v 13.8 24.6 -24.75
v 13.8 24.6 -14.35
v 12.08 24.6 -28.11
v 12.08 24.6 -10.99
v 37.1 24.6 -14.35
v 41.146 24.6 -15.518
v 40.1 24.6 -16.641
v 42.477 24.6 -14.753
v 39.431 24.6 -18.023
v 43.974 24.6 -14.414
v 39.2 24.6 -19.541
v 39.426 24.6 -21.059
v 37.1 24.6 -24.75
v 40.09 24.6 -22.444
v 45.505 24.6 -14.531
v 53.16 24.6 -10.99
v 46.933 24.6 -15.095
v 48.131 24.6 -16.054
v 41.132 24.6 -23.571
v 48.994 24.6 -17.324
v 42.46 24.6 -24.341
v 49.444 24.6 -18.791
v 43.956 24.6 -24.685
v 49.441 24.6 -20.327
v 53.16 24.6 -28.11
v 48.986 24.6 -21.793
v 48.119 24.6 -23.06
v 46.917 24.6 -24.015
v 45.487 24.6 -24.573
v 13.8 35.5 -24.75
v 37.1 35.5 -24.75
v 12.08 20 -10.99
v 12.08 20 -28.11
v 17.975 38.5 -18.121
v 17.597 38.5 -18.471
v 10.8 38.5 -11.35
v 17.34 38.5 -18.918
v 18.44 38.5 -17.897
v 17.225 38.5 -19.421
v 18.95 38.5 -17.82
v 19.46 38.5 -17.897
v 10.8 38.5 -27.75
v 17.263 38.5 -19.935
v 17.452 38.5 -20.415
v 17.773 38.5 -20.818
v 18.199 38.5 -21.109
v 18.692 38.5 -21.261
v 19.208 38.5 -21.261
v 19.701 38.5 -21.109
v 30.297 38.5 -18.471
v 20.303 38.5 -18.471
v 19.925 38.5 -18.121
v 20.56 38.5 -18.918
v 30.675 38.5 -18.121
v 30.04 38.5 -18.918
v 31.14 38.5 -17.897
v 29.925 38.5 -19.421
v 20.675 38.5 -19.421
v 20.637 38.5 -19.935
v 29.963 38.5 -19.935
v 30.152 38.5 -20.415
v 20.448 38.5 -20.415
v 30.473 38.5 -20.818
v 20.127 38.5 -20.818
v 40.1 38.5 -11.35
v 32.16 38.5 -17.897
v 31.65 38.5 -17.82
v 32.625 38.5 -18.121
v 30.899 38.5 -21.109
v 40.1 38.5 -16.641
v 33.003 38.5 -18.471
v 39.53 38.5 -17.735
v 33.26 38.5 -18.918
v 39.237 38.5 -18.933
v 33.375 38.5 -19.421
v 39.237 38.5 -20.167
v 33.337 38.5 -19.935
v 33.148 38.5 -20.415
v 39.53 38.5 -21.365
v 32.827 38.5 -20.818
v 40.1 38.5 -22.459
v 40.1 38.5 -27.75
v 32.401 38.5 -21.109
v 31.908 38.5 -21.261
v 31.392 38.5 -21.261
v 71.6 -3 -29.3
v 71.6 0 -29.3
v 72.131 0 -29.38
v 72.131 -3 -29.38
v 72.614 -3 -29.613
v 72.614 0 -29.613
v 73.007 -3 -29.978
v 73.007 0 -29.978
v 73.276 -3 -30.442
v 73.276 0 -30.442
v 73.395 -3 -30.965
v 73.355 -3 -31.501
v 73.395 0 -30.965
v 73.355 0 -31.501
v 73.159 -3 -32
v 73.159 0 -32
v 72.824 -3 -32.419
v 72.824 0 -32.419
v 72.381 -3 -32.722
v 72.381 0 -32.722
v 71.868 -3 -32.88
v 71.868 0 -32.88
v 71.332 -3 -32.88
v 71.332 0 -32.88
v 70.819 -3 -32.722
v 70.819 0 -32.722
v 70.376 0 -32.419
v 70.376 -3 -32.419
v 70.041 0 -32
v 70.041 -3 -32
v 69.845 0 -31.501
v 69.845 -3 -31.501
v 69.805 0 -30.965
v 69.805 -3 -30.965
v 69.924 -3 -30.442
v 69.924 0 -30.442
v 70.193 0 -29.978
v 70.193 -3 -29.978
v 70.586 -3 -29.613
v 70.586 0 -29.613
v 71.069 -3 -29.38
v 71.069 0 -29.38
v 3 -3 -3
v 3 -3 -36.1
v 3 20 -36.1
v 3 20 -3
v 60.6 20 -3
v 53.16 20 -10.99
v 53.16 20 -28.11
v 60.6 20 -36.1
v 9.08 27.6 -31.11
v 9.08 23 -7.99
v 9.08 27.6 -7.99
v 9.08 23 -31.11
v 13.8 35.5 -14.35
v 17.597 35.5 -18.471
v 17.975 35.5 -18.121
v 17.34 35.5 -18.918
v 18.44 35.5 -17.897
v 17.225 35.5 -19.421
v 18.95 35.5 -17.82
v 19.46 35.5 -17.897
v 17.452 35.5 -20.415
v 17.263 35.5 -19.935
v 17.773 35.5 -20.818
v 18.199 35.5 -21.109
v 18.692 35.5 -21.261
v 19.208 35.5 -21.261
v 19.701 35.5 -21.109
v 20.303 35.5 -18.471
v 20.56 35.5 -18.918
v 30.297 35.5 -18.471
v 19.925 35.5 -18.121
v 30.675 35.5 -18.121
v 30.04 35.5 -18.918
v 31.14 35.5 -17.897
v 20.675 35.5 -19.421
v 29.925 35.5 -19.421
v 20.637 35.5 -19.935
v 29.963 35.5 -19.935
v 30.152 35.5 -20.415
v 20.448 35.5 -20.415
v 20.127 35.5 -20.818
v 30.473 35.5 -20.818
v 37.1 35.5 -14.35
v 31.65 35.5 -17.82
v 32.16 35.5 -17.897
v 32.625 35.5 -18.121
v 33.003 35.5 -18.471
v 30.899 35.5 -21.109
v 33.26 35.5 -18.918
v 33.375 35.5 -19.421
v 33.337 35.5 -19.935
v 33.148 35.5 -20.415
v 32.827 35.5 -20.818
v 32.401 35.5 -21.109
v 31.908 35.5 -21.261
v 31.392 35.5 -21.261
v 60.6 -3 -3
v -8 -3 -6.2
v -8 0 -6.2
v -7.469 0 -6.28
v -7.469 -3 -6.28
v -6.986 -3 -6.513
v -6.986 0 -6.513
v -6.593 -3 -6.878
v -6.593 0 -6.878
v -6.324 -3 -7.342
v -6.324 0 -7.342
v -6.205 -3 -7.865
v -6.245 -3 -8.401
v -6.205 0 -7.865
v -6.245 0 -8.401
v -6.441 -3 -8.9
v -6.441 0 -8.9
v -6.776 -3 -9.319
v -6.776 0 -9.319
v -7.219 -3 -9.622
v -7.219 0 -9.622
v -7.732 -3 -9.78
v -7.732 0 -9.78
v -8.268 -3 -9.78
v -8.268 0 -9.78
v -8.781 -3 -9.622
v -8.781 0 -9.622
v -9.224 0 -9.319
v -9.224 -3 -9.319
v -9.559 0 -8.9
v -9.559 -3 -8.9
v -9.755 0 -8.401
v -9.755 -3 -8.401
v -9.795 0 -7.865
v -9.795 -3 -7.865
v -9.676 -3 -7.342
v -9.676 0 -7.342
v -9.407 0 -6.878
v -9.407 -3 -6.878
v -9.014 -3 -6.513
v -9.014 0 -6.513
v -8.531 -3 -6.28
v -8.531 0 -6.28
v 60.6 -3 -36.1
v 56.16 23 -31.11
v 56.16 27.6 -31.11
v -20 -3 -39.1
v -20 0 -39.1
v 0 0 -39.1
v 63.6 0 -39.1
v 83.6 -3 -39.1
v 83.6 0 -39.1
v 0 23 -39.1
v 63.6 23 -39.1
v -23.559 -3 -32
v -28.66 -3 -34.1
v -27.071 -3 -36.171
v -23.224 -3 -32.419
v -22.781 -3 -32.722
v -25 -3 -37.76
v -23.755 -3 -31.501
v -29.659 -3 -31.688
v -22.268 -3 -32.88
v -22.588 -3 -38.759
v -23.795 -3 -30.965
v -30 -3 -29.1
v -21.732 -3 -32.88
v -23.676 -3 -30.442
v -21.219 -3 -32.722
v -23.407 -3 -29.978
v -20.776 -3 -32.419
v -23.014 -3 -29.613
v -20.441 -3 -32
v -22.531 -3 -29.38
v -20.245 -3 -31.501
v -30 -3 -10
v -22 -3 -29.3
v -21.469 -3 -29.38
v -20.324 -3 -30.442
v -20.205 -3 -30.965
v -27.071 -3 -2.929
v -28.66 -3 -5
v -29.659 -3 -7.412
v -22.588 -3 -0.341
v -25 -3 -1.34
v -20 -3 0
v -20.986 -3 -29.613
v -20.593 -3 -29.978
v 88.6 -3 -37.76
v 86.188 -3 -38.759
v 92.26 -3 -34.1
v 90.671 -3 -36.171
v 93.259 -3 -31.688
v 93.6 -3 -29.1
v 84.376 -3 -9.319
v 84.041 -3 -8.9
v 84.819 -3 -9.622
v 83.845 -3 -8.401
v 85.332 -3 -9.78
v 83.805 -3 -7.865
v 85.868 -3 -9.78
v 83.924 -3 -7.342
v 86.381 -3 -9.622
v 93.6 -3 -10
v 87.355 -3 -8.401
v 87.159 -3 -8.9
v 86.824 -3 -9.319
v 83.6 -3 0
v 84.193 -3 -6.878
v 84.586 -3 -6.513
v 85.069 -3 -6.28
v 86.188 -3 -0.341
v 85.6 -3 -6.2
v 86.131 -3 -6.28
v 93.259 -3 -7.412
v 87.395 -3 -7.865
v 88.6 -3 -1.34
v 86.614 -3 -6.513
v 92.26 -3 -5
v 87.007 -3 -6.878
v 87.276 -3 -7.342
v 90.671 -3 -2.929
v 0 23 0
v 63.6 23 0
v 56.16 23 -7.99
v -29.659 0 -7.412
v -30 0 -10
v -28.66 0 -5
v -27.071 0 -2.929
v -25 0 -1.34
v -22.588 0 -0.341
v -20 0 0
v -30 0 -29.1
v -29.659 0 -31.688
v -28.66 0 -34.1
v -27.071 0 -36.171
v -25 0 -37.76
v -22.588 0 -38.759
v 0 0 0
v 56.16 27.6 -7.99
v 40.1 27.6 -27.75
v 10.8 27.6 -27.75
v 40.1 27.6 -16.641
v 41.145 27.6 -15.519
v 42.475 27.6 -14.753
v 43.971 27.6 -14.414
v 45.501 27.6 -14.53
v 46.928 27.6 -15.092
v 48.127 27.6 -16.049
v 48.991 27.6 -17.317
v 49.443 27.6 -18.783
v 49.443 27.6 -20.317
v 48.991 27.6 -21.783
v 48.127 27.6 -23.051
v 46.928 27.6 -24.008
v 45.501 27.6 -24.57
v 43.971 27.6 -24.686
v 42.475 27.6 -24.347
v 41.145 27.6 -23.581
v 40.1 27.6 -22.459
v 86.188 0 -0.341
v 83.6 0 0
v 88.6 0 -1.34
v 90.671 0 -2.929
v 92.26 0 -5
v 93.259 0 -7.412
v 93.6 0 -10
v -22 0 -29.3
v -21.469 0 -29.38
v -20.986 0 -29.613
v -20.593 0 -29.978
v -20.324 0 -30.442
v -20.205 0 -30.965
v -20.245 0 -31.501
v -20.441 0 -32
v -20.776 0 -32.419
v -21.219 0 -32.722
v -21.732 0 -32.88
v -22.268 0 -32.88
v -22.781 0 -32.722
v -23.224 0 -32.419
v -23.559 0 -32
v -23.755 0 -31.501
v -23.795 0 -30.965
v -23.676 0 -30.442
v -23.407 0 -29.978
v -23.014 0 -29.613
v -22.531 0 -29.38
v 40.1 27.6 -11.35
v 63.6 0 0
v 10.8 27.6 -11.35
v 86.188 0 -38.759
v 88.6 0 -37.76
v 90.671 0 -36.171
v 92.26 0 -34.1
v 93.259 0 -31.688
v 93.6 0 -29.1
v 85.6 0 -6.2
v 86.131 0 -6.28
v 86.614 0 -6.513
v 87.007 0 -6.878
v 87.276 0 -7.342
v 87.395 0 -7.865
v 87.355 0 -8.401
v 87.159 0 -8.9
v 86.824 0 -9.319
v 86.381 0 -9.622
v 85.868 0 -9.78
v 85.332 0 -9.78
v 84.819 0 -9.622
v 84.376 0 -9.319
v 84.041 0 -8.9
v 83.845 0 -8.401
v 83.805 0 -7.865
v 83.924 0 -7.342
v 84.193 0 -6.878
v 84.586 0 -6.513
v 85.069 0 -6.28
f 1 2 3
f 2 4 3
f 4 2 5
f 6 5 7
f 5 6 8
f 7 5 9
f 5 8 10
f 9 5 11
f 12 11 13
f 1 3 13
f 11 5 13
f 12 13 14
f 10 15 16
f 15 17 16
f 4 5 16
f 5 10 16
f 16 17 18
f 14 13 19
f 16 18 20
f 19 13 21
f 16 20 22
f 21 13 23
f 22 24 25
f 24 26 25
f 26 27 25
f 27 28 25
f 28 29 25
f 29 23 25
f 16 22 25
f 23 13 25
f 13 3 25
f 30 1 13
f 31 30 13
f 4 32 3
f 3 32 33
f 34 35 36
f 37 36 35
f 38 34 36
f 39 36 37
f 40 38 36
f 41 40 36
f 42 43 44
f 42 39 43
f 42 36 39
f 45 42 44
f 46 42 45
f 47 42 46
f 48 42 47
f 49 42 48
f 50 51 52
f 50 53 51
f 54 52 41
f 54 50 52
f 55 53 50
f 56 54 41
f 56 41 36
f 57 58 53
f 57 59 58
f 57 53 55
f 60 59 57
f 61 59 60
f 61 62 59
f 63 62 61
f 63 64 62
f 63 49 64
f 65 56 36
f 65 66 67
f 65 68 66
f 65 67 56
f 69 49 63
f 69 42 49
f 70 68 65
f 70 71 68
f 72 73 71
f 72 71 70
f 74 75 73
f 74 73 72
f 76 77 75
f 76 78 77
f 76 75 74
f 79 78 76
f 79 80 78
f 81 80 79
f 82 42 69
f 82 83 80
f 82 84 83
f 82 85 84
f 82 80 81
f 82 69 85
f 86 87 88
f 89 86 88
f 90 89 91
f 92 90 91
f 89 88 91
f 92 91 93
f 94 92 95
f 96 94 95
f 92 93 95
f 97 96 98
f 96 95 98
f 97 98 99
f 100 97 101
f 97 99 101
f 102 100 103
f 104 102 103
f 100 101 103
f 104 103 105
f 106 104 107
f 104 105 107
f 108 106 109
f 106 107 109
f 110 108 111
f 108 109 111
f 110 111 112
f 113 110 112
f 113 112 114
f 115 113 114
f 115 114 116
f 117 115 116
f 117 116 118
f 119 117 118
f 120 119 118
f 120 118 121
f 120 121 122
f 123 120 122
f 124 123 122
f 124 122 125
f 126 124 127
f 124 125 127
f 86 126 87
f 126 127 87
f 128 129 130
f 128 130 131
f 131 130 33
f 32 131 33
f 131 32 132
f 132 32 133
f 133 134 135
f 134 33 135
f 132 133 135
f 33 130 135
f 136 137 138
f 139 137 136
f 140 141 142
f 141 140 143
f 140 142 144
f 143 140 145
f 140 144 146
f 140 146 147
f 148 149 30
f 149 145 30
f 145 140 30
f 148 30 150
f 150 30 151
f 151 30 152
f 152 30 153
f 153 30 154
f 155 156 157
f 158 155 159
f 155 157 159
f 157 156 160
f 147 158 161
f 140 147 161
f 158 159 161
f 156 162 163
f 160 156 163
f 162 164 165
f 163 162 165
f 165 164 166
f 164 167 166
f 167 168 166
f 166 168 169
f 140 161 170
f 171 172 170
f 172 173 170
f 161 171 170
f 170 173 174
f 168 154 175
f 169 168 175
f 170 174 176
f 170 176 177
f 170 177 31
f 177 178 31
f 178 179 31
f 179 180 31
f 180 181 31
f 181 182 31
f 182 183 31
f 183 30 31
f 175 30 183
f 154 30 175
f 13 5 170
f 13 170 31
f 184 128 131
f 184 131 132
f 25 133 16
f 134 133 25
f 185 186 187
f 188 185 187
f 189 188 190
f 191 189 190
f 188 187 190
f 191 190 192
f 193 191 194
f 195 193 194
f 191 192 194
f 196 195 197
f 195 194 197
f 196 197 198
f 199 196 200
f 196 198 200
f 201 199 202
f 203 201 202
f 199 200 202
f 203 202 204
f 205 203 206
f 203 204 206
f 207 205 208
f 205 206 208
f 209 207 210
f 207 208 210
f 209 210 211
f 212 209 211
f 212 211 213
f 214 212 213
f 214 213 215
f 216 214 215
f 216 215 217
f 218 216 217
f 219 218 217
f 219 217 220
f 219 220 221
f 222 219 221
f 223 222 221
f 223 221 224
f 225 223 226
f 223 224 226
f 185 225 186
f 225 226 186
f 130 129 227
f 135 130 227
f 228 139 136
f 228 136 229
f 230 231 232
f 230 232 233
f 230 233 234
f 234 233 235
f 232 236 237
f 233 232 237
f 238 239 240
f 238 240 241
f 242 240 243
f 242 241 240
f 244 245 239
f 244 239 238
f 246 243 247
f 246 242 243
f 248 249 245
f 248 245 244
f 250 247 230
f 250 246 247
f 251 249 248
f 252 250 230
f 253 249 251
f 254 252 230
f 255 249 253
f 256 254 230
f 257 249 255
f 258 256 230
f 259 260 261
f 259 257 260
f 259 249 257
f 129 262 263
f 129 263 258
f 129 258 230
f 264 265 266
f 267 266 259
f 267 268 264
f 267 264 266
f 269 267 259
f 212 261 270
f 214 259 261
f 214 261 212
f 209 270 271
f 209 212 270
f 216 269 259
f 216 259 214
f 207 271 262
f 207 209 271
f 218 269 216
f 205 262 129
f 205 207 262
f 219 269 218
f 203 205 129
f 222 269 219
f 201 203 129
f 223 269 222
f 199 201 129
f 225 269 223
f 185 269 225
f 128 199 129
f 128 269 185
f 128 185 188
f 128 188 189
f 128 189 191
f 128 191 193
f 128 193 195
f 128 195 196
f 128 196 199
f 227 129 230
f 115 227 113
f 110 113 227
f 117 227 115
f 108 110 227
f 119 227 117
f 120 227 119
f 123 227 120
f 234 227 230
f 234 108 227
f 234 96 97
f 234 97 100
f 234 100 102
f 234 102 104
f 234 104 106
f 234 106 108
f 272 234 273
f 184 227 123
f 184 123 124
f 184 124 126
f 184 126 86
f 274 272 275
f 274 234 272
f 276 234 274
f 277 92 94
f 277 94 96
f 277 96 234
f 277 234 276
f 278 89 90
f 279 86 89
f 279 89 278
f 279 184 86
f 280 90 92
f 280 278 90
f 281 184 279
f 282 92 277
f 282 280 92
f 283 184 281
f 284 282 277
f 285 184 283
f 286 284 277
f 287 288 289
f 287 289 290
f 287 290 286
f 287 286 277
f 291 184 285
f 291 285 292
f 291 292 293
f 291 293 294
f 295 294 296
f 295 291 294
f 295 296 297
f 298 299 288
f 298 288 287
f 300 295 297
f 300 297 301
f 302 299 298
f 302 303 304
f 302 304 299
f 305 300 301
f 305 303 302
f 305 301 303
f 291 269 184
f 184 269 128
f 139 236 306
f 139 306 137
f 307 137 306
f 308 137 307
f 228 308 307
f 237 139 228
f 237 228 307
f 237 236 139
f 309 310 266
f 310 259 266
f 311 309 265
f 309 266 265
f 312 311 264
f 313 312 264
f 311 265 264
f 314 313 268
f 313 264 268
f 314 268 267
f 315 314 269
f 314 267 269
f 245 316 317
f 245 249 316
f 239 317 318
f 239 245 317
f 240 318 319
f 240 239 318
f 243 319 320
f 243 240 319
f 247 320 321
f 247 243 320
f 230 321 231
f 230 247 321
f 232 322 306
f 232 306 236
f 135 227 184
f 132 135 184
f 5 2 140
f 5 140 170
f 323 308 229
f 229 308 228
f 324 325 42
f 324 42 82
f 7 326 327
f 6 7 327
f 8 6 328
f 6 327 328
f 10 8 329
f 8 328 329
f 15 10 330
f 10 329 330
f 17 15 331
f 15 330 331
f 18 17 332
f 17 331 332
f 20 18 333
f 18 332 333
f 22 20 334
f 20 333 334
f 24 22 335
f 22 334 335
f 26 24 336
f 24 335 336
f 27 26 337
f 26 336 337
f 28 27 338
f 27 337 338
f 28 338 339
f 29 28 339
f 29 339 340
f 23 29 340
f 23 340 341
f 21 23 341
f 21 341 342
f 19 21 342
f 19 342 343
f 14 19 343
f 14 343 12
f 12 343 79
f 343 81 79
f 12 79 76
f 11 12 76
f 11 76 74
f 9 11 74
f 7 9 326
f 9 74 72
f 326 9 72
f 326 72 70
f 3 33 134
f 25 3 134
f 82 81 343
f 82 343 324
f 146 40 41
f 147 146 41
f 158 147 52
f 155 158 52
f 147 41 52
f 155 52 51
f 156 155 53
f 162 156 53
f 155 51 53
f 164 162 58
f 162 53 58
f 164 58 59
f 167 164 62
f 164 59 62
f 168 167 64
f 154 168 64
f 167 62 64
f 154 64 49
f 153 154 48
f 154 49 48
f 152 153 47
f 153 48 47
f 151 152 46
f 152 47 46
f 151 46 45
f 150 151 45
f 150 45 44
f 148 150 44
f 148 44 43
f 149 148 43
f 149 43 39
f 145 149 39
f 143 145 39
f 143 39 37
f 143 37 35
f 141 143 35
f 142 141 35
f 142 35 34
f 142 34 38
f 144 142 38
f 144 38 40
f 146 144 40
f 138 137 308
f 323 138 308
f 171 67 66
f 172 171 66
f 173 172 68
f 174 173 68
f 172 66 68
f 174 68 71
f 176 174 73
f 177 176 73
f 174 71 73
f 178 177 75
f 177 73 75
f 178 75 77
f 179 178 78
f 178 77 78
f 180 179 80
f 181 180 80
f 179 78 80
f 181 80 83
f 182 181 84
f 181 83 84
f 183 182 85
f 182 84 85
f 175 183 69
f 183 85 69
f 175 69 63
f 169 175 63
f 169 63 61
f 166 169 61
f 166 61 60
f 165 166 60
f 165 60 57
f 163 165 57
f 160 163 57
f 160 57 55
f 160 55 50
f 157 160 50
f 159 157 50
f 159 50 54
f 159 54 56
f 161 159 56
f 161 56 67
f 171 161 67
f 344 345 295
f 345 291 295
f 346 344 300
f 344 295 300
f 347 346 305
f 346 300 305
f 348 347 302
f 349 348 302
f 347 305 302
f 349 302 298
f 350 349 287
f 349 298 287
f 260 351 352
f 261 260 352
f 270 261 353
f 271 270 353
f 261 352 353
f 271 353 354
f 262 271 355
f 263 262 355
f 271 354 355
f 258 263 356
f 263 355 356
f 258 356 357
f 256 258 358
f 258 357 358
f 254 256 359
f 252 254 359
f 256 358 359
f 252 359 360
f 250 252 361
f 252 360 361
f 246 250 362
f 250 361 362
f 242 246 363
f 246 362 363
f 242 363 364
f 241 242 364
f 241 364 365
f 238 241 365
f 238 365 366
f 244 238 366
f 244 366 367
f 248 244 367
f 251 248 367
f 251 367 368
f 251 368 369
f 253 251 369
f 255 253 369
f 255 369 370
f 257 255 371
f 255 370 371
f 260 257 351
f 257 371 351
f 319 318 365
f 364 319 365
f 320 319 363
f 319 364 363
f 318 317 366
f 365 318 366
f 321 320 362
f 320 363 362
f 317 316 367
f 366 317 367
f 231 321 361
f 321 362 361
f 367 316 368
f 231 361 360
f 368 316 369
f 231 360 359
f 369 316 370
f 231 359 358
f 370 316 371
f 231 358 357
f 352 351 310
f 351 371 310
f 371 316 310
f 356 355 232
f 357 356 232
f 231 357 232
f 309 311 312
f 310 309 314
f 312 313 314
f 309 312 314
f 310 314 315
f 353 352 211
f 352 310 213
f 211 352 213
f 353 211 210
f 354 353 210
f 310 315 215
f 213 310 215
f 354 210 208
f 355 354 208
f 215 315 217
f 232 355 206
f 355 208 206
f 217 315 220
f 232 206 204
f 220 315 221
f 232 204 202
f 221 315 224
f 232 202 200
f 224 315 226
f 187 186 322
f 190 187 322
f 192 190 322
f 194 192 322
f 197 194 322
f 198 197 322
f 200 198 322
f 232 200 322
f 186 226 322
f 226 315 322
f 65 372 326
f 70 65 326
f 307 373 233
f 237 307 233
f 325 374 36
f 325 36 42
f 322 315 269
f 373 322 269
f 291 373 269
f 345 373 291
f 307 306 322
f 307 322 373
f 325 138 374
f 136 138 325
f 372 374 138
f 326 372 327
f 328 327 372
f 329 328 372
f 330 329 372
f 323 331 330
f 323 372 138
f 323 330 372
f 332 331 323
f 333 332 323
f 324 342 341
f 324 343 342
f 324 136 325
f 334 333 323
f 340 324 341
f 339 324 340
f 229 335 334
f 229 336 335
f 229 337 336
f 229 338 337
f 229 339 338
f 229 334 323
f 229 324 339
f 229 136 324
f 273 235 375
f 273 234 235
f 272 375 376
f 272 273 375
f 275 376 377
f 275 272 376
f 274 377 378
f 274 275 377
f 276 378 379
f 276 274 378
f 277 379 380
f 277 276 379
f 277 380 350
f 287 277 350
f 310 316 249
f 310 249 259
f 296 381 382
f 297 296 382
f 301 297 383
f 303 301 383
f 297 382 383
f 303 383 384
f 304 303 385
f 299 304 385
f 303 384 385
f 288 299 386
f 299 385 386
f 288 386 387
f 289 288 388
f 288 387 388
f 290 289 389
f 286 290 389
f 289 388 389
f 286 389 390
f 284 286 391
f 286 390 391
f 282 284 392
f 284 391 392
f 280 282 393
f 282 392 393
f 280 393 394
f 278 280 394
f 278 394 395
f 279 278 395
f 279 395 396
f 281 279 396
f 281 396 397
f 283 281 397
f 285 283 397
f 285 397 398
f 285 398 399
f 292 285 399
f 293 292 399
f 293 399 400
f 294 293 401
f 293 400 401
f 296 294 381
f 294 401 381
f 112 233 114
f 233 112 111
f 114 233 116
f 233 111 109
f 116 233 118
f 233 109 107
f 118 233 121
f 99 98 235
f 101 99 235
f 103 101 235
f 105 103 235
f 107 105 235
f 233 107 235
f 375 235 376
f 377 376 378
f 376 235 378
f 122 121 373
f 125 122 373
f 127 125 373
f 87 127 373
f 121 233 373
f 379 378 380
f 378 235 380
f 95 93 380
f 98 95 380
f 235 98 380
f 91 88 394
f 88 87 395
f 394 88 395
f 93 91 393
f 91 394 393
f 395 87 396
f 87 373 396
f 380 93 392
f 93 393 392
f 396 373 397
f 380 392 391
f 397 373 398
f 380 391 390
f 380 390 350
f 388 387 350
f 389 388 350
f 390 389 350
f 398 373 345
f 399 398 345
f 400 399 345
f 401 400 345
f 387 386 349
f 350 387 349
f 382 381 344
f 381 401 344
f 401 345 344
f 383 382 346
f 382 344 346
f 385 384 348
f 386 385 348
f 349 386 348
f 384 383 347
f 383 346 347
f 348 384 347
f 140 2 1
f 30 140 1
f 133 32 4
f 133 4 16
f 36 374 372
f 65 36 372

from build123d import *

# Parameters (mm, degrees)
SKETCH1_W           = 63.6
SKETCH1_H           = 39.1
BOSS_EXTRUDE1_DEPTH = 23
SKETCH3_W           = 47.08
SKETCH3_H           = 23.12
BOSS_EXTRUDE2_DEPTH = 4.6
SKETCH4_W           = 29.3
SKETCH4_H           = 16.4
BOSS_EXTRUDE3_DEPTH = 10.9
SHELL1_T            = -3
SKETCH5_W           = 123.6
SKETCH5_H           = 39.1
BOSS_EXTRUDE4_DEPTH = 3
SKETCH6_R           = 1.73
CUT_EXTRUDE1_DEPTH  = 110.599361312
SKETCH7_W           = 57.6
SKETCH7_H           = 33.1
CUT_EXTRUDE2_DEPTH  = 3
SKETCH8_R           = 1.8
CUT_EXTRUDE3_DEPTH  = 3
FILLET1_R           = 10
SKETCH9_R           = 5.15
CUT_EXTRUDE4_DEPTH  = 10
SKETCH12_R          = 5.15
CUT_EXTRUDE5_DEPTH  = 110.599361312


with BuildPart() as part:
    # Sketch1 → Boss-Extrude1 (new body)
    with BuildSketch(Plane(origin=(0, 0, 0), x_dir=(1, 0, 0), z_dir=(0, 1, 0))):
        with Locations((31.8, 19.55)):
            Rectangle(SKETCH1_W, SKETCH1_H)
    extrude(amount=BOSS_EXTRUDE1_DEPTH)

    # Sketch3 → Boss-Extrude2 (add)
    with BuildSketch(Plane(origin=(0, 23, 0), x_dir=(1, 0, 0), z_dir=(0, 1, 0))):
        with Locations((32.62, 19.55)):
            Rectangle(SKETCH3_W, SKETCH3_H)
    extrude(amount=BOSS_EXTRUDE2_DEPTH)

    # Sketch4 → Boss-Extrude3 (add)
    with BuildSketch(Plane(origin=(0, 27.6, 0), x_dir=(1, 0, 0), z_dir=(0, 1, 0))):
        with Locations((25.45, 19.55)):
            Rectangle(SKETCH4_W, SKETCH4_H)
    extrude(amount=BOSS_EXTRUDE3_DEPTH)

    # Shell1
    shell1_openings = [part.faces().sort_by_distance(p)[0] for p in [
        (31.8, 0, -19.55),
    ]]
    offset(amount=SHELL1_T, openings=shell1_openings, kind=Kind.INTERSECTION)

    # Sketch5 → Boss-Extrude4 (add)
    with BuildSketch(Plane.XZ):
        with Locations((31.8, -19.55)):
            Rectangle(SKETCH5_W, SKETCH5_H)
    extrude(amount=BOSS_EXTRUDE4_DEPTH)

    # Sketch6 → Cut-Extrude1 (cut, through all)
    with BuildSketch(Plane(origin=(0, 38.5, 0), x_dir=(1, 0, 0), z_dir=(0, 1, 0))):
        with Locations(Location((18.95, 19.55, 0), (0, 0, 270))):
            Circle(SKETCH6_R)
        with Locations(Location((31.65, 19.55, 0), (0, 0, 270))):
            Circle(SKETCH6_R)
    extrude(amount=-CUT_EXTRUDE1_DEPTH, mode=Mode.SUBTRACT)

    # Sketch7 → Cut-Extrude2 (cut)
    with BuildSketch(Plane.XZ.offset(3)):
        with Locations((31.8, -19.55)):
            Rectangle(SKETCH7_W, SKETCH7_H)
    extrude(amount=-CUT_EXTRUDE2_DEPTH, mode=Mode.SUBTRACT)

    # Sketch8 → Cut-Extrude3 (cut)
    with BuildSketch(Plane(origin=(0, 0, 0), x_dir=(1, 0, 0), z_dir=(0, 1, 0))):
        with Locations(Location((85.6, 8, 0), (0, 0, 270))):
            Circle(SKETCH8_R)
        with Locations(Location((71.6, 31.1, 0), (0, 0, 270))):
            Circle(SKETCH8_R)
        with Locations(Location((-8, 8, 0), (0, 0, 270))):
            Circle(SKETCH8_R)
        with Locations(Location((-22, 31.1, 0), (0, 0, 270))):
            Circle(SKETCH8_R)
    extrude(amount=-CUT_EXTRUDE3_DEPTH, mode=Mode.SUBTRACT)

    # Fillet1
    fillet1_edges = [part.edges().sort_by_distance(p)[0] for p in [
        (93.6, -1.5, -39.1),
        (93.6, -1.5, 0),
        (-30, -1.5, 0),
        (-30, -1.5, -39.1),
    ]]
    fillet(fillet1_edges, radius=FILLET1_R)

    # Sketch9 → Cut-Extrude4 (cut)
    with BuildSketch(Plane(origin=(0, 27.6, 0), x_dir=(1, 0, 0), z_dir=(0, 1, 0))):
        with Locations(Location((44.35, 19.55, 0), (0, 0, 214.386893027))):
            Circle(SKETCH9_R)
    extrude(amount=-CUT_EXTRUDE4_DEPTH, mode=Mode.SUBTRACT)

    # Sketch12 → Cut-Extrude5 (cut, through all)
    with BuildSketch(Plane(origin=(0, 38.5, 0), x_dir=(1, 0, 0), z_dir=(0, 1, 0))):
        with Locations(Location((44.35, 19.55, 0), (0, 0, 214.386893027))):
            Circle(SKETCH12_R)
    extrude(amount=-CUT_EXTRUDE5_DEPTH, mode=Mode.SUBTRACT)


solid = part.part
